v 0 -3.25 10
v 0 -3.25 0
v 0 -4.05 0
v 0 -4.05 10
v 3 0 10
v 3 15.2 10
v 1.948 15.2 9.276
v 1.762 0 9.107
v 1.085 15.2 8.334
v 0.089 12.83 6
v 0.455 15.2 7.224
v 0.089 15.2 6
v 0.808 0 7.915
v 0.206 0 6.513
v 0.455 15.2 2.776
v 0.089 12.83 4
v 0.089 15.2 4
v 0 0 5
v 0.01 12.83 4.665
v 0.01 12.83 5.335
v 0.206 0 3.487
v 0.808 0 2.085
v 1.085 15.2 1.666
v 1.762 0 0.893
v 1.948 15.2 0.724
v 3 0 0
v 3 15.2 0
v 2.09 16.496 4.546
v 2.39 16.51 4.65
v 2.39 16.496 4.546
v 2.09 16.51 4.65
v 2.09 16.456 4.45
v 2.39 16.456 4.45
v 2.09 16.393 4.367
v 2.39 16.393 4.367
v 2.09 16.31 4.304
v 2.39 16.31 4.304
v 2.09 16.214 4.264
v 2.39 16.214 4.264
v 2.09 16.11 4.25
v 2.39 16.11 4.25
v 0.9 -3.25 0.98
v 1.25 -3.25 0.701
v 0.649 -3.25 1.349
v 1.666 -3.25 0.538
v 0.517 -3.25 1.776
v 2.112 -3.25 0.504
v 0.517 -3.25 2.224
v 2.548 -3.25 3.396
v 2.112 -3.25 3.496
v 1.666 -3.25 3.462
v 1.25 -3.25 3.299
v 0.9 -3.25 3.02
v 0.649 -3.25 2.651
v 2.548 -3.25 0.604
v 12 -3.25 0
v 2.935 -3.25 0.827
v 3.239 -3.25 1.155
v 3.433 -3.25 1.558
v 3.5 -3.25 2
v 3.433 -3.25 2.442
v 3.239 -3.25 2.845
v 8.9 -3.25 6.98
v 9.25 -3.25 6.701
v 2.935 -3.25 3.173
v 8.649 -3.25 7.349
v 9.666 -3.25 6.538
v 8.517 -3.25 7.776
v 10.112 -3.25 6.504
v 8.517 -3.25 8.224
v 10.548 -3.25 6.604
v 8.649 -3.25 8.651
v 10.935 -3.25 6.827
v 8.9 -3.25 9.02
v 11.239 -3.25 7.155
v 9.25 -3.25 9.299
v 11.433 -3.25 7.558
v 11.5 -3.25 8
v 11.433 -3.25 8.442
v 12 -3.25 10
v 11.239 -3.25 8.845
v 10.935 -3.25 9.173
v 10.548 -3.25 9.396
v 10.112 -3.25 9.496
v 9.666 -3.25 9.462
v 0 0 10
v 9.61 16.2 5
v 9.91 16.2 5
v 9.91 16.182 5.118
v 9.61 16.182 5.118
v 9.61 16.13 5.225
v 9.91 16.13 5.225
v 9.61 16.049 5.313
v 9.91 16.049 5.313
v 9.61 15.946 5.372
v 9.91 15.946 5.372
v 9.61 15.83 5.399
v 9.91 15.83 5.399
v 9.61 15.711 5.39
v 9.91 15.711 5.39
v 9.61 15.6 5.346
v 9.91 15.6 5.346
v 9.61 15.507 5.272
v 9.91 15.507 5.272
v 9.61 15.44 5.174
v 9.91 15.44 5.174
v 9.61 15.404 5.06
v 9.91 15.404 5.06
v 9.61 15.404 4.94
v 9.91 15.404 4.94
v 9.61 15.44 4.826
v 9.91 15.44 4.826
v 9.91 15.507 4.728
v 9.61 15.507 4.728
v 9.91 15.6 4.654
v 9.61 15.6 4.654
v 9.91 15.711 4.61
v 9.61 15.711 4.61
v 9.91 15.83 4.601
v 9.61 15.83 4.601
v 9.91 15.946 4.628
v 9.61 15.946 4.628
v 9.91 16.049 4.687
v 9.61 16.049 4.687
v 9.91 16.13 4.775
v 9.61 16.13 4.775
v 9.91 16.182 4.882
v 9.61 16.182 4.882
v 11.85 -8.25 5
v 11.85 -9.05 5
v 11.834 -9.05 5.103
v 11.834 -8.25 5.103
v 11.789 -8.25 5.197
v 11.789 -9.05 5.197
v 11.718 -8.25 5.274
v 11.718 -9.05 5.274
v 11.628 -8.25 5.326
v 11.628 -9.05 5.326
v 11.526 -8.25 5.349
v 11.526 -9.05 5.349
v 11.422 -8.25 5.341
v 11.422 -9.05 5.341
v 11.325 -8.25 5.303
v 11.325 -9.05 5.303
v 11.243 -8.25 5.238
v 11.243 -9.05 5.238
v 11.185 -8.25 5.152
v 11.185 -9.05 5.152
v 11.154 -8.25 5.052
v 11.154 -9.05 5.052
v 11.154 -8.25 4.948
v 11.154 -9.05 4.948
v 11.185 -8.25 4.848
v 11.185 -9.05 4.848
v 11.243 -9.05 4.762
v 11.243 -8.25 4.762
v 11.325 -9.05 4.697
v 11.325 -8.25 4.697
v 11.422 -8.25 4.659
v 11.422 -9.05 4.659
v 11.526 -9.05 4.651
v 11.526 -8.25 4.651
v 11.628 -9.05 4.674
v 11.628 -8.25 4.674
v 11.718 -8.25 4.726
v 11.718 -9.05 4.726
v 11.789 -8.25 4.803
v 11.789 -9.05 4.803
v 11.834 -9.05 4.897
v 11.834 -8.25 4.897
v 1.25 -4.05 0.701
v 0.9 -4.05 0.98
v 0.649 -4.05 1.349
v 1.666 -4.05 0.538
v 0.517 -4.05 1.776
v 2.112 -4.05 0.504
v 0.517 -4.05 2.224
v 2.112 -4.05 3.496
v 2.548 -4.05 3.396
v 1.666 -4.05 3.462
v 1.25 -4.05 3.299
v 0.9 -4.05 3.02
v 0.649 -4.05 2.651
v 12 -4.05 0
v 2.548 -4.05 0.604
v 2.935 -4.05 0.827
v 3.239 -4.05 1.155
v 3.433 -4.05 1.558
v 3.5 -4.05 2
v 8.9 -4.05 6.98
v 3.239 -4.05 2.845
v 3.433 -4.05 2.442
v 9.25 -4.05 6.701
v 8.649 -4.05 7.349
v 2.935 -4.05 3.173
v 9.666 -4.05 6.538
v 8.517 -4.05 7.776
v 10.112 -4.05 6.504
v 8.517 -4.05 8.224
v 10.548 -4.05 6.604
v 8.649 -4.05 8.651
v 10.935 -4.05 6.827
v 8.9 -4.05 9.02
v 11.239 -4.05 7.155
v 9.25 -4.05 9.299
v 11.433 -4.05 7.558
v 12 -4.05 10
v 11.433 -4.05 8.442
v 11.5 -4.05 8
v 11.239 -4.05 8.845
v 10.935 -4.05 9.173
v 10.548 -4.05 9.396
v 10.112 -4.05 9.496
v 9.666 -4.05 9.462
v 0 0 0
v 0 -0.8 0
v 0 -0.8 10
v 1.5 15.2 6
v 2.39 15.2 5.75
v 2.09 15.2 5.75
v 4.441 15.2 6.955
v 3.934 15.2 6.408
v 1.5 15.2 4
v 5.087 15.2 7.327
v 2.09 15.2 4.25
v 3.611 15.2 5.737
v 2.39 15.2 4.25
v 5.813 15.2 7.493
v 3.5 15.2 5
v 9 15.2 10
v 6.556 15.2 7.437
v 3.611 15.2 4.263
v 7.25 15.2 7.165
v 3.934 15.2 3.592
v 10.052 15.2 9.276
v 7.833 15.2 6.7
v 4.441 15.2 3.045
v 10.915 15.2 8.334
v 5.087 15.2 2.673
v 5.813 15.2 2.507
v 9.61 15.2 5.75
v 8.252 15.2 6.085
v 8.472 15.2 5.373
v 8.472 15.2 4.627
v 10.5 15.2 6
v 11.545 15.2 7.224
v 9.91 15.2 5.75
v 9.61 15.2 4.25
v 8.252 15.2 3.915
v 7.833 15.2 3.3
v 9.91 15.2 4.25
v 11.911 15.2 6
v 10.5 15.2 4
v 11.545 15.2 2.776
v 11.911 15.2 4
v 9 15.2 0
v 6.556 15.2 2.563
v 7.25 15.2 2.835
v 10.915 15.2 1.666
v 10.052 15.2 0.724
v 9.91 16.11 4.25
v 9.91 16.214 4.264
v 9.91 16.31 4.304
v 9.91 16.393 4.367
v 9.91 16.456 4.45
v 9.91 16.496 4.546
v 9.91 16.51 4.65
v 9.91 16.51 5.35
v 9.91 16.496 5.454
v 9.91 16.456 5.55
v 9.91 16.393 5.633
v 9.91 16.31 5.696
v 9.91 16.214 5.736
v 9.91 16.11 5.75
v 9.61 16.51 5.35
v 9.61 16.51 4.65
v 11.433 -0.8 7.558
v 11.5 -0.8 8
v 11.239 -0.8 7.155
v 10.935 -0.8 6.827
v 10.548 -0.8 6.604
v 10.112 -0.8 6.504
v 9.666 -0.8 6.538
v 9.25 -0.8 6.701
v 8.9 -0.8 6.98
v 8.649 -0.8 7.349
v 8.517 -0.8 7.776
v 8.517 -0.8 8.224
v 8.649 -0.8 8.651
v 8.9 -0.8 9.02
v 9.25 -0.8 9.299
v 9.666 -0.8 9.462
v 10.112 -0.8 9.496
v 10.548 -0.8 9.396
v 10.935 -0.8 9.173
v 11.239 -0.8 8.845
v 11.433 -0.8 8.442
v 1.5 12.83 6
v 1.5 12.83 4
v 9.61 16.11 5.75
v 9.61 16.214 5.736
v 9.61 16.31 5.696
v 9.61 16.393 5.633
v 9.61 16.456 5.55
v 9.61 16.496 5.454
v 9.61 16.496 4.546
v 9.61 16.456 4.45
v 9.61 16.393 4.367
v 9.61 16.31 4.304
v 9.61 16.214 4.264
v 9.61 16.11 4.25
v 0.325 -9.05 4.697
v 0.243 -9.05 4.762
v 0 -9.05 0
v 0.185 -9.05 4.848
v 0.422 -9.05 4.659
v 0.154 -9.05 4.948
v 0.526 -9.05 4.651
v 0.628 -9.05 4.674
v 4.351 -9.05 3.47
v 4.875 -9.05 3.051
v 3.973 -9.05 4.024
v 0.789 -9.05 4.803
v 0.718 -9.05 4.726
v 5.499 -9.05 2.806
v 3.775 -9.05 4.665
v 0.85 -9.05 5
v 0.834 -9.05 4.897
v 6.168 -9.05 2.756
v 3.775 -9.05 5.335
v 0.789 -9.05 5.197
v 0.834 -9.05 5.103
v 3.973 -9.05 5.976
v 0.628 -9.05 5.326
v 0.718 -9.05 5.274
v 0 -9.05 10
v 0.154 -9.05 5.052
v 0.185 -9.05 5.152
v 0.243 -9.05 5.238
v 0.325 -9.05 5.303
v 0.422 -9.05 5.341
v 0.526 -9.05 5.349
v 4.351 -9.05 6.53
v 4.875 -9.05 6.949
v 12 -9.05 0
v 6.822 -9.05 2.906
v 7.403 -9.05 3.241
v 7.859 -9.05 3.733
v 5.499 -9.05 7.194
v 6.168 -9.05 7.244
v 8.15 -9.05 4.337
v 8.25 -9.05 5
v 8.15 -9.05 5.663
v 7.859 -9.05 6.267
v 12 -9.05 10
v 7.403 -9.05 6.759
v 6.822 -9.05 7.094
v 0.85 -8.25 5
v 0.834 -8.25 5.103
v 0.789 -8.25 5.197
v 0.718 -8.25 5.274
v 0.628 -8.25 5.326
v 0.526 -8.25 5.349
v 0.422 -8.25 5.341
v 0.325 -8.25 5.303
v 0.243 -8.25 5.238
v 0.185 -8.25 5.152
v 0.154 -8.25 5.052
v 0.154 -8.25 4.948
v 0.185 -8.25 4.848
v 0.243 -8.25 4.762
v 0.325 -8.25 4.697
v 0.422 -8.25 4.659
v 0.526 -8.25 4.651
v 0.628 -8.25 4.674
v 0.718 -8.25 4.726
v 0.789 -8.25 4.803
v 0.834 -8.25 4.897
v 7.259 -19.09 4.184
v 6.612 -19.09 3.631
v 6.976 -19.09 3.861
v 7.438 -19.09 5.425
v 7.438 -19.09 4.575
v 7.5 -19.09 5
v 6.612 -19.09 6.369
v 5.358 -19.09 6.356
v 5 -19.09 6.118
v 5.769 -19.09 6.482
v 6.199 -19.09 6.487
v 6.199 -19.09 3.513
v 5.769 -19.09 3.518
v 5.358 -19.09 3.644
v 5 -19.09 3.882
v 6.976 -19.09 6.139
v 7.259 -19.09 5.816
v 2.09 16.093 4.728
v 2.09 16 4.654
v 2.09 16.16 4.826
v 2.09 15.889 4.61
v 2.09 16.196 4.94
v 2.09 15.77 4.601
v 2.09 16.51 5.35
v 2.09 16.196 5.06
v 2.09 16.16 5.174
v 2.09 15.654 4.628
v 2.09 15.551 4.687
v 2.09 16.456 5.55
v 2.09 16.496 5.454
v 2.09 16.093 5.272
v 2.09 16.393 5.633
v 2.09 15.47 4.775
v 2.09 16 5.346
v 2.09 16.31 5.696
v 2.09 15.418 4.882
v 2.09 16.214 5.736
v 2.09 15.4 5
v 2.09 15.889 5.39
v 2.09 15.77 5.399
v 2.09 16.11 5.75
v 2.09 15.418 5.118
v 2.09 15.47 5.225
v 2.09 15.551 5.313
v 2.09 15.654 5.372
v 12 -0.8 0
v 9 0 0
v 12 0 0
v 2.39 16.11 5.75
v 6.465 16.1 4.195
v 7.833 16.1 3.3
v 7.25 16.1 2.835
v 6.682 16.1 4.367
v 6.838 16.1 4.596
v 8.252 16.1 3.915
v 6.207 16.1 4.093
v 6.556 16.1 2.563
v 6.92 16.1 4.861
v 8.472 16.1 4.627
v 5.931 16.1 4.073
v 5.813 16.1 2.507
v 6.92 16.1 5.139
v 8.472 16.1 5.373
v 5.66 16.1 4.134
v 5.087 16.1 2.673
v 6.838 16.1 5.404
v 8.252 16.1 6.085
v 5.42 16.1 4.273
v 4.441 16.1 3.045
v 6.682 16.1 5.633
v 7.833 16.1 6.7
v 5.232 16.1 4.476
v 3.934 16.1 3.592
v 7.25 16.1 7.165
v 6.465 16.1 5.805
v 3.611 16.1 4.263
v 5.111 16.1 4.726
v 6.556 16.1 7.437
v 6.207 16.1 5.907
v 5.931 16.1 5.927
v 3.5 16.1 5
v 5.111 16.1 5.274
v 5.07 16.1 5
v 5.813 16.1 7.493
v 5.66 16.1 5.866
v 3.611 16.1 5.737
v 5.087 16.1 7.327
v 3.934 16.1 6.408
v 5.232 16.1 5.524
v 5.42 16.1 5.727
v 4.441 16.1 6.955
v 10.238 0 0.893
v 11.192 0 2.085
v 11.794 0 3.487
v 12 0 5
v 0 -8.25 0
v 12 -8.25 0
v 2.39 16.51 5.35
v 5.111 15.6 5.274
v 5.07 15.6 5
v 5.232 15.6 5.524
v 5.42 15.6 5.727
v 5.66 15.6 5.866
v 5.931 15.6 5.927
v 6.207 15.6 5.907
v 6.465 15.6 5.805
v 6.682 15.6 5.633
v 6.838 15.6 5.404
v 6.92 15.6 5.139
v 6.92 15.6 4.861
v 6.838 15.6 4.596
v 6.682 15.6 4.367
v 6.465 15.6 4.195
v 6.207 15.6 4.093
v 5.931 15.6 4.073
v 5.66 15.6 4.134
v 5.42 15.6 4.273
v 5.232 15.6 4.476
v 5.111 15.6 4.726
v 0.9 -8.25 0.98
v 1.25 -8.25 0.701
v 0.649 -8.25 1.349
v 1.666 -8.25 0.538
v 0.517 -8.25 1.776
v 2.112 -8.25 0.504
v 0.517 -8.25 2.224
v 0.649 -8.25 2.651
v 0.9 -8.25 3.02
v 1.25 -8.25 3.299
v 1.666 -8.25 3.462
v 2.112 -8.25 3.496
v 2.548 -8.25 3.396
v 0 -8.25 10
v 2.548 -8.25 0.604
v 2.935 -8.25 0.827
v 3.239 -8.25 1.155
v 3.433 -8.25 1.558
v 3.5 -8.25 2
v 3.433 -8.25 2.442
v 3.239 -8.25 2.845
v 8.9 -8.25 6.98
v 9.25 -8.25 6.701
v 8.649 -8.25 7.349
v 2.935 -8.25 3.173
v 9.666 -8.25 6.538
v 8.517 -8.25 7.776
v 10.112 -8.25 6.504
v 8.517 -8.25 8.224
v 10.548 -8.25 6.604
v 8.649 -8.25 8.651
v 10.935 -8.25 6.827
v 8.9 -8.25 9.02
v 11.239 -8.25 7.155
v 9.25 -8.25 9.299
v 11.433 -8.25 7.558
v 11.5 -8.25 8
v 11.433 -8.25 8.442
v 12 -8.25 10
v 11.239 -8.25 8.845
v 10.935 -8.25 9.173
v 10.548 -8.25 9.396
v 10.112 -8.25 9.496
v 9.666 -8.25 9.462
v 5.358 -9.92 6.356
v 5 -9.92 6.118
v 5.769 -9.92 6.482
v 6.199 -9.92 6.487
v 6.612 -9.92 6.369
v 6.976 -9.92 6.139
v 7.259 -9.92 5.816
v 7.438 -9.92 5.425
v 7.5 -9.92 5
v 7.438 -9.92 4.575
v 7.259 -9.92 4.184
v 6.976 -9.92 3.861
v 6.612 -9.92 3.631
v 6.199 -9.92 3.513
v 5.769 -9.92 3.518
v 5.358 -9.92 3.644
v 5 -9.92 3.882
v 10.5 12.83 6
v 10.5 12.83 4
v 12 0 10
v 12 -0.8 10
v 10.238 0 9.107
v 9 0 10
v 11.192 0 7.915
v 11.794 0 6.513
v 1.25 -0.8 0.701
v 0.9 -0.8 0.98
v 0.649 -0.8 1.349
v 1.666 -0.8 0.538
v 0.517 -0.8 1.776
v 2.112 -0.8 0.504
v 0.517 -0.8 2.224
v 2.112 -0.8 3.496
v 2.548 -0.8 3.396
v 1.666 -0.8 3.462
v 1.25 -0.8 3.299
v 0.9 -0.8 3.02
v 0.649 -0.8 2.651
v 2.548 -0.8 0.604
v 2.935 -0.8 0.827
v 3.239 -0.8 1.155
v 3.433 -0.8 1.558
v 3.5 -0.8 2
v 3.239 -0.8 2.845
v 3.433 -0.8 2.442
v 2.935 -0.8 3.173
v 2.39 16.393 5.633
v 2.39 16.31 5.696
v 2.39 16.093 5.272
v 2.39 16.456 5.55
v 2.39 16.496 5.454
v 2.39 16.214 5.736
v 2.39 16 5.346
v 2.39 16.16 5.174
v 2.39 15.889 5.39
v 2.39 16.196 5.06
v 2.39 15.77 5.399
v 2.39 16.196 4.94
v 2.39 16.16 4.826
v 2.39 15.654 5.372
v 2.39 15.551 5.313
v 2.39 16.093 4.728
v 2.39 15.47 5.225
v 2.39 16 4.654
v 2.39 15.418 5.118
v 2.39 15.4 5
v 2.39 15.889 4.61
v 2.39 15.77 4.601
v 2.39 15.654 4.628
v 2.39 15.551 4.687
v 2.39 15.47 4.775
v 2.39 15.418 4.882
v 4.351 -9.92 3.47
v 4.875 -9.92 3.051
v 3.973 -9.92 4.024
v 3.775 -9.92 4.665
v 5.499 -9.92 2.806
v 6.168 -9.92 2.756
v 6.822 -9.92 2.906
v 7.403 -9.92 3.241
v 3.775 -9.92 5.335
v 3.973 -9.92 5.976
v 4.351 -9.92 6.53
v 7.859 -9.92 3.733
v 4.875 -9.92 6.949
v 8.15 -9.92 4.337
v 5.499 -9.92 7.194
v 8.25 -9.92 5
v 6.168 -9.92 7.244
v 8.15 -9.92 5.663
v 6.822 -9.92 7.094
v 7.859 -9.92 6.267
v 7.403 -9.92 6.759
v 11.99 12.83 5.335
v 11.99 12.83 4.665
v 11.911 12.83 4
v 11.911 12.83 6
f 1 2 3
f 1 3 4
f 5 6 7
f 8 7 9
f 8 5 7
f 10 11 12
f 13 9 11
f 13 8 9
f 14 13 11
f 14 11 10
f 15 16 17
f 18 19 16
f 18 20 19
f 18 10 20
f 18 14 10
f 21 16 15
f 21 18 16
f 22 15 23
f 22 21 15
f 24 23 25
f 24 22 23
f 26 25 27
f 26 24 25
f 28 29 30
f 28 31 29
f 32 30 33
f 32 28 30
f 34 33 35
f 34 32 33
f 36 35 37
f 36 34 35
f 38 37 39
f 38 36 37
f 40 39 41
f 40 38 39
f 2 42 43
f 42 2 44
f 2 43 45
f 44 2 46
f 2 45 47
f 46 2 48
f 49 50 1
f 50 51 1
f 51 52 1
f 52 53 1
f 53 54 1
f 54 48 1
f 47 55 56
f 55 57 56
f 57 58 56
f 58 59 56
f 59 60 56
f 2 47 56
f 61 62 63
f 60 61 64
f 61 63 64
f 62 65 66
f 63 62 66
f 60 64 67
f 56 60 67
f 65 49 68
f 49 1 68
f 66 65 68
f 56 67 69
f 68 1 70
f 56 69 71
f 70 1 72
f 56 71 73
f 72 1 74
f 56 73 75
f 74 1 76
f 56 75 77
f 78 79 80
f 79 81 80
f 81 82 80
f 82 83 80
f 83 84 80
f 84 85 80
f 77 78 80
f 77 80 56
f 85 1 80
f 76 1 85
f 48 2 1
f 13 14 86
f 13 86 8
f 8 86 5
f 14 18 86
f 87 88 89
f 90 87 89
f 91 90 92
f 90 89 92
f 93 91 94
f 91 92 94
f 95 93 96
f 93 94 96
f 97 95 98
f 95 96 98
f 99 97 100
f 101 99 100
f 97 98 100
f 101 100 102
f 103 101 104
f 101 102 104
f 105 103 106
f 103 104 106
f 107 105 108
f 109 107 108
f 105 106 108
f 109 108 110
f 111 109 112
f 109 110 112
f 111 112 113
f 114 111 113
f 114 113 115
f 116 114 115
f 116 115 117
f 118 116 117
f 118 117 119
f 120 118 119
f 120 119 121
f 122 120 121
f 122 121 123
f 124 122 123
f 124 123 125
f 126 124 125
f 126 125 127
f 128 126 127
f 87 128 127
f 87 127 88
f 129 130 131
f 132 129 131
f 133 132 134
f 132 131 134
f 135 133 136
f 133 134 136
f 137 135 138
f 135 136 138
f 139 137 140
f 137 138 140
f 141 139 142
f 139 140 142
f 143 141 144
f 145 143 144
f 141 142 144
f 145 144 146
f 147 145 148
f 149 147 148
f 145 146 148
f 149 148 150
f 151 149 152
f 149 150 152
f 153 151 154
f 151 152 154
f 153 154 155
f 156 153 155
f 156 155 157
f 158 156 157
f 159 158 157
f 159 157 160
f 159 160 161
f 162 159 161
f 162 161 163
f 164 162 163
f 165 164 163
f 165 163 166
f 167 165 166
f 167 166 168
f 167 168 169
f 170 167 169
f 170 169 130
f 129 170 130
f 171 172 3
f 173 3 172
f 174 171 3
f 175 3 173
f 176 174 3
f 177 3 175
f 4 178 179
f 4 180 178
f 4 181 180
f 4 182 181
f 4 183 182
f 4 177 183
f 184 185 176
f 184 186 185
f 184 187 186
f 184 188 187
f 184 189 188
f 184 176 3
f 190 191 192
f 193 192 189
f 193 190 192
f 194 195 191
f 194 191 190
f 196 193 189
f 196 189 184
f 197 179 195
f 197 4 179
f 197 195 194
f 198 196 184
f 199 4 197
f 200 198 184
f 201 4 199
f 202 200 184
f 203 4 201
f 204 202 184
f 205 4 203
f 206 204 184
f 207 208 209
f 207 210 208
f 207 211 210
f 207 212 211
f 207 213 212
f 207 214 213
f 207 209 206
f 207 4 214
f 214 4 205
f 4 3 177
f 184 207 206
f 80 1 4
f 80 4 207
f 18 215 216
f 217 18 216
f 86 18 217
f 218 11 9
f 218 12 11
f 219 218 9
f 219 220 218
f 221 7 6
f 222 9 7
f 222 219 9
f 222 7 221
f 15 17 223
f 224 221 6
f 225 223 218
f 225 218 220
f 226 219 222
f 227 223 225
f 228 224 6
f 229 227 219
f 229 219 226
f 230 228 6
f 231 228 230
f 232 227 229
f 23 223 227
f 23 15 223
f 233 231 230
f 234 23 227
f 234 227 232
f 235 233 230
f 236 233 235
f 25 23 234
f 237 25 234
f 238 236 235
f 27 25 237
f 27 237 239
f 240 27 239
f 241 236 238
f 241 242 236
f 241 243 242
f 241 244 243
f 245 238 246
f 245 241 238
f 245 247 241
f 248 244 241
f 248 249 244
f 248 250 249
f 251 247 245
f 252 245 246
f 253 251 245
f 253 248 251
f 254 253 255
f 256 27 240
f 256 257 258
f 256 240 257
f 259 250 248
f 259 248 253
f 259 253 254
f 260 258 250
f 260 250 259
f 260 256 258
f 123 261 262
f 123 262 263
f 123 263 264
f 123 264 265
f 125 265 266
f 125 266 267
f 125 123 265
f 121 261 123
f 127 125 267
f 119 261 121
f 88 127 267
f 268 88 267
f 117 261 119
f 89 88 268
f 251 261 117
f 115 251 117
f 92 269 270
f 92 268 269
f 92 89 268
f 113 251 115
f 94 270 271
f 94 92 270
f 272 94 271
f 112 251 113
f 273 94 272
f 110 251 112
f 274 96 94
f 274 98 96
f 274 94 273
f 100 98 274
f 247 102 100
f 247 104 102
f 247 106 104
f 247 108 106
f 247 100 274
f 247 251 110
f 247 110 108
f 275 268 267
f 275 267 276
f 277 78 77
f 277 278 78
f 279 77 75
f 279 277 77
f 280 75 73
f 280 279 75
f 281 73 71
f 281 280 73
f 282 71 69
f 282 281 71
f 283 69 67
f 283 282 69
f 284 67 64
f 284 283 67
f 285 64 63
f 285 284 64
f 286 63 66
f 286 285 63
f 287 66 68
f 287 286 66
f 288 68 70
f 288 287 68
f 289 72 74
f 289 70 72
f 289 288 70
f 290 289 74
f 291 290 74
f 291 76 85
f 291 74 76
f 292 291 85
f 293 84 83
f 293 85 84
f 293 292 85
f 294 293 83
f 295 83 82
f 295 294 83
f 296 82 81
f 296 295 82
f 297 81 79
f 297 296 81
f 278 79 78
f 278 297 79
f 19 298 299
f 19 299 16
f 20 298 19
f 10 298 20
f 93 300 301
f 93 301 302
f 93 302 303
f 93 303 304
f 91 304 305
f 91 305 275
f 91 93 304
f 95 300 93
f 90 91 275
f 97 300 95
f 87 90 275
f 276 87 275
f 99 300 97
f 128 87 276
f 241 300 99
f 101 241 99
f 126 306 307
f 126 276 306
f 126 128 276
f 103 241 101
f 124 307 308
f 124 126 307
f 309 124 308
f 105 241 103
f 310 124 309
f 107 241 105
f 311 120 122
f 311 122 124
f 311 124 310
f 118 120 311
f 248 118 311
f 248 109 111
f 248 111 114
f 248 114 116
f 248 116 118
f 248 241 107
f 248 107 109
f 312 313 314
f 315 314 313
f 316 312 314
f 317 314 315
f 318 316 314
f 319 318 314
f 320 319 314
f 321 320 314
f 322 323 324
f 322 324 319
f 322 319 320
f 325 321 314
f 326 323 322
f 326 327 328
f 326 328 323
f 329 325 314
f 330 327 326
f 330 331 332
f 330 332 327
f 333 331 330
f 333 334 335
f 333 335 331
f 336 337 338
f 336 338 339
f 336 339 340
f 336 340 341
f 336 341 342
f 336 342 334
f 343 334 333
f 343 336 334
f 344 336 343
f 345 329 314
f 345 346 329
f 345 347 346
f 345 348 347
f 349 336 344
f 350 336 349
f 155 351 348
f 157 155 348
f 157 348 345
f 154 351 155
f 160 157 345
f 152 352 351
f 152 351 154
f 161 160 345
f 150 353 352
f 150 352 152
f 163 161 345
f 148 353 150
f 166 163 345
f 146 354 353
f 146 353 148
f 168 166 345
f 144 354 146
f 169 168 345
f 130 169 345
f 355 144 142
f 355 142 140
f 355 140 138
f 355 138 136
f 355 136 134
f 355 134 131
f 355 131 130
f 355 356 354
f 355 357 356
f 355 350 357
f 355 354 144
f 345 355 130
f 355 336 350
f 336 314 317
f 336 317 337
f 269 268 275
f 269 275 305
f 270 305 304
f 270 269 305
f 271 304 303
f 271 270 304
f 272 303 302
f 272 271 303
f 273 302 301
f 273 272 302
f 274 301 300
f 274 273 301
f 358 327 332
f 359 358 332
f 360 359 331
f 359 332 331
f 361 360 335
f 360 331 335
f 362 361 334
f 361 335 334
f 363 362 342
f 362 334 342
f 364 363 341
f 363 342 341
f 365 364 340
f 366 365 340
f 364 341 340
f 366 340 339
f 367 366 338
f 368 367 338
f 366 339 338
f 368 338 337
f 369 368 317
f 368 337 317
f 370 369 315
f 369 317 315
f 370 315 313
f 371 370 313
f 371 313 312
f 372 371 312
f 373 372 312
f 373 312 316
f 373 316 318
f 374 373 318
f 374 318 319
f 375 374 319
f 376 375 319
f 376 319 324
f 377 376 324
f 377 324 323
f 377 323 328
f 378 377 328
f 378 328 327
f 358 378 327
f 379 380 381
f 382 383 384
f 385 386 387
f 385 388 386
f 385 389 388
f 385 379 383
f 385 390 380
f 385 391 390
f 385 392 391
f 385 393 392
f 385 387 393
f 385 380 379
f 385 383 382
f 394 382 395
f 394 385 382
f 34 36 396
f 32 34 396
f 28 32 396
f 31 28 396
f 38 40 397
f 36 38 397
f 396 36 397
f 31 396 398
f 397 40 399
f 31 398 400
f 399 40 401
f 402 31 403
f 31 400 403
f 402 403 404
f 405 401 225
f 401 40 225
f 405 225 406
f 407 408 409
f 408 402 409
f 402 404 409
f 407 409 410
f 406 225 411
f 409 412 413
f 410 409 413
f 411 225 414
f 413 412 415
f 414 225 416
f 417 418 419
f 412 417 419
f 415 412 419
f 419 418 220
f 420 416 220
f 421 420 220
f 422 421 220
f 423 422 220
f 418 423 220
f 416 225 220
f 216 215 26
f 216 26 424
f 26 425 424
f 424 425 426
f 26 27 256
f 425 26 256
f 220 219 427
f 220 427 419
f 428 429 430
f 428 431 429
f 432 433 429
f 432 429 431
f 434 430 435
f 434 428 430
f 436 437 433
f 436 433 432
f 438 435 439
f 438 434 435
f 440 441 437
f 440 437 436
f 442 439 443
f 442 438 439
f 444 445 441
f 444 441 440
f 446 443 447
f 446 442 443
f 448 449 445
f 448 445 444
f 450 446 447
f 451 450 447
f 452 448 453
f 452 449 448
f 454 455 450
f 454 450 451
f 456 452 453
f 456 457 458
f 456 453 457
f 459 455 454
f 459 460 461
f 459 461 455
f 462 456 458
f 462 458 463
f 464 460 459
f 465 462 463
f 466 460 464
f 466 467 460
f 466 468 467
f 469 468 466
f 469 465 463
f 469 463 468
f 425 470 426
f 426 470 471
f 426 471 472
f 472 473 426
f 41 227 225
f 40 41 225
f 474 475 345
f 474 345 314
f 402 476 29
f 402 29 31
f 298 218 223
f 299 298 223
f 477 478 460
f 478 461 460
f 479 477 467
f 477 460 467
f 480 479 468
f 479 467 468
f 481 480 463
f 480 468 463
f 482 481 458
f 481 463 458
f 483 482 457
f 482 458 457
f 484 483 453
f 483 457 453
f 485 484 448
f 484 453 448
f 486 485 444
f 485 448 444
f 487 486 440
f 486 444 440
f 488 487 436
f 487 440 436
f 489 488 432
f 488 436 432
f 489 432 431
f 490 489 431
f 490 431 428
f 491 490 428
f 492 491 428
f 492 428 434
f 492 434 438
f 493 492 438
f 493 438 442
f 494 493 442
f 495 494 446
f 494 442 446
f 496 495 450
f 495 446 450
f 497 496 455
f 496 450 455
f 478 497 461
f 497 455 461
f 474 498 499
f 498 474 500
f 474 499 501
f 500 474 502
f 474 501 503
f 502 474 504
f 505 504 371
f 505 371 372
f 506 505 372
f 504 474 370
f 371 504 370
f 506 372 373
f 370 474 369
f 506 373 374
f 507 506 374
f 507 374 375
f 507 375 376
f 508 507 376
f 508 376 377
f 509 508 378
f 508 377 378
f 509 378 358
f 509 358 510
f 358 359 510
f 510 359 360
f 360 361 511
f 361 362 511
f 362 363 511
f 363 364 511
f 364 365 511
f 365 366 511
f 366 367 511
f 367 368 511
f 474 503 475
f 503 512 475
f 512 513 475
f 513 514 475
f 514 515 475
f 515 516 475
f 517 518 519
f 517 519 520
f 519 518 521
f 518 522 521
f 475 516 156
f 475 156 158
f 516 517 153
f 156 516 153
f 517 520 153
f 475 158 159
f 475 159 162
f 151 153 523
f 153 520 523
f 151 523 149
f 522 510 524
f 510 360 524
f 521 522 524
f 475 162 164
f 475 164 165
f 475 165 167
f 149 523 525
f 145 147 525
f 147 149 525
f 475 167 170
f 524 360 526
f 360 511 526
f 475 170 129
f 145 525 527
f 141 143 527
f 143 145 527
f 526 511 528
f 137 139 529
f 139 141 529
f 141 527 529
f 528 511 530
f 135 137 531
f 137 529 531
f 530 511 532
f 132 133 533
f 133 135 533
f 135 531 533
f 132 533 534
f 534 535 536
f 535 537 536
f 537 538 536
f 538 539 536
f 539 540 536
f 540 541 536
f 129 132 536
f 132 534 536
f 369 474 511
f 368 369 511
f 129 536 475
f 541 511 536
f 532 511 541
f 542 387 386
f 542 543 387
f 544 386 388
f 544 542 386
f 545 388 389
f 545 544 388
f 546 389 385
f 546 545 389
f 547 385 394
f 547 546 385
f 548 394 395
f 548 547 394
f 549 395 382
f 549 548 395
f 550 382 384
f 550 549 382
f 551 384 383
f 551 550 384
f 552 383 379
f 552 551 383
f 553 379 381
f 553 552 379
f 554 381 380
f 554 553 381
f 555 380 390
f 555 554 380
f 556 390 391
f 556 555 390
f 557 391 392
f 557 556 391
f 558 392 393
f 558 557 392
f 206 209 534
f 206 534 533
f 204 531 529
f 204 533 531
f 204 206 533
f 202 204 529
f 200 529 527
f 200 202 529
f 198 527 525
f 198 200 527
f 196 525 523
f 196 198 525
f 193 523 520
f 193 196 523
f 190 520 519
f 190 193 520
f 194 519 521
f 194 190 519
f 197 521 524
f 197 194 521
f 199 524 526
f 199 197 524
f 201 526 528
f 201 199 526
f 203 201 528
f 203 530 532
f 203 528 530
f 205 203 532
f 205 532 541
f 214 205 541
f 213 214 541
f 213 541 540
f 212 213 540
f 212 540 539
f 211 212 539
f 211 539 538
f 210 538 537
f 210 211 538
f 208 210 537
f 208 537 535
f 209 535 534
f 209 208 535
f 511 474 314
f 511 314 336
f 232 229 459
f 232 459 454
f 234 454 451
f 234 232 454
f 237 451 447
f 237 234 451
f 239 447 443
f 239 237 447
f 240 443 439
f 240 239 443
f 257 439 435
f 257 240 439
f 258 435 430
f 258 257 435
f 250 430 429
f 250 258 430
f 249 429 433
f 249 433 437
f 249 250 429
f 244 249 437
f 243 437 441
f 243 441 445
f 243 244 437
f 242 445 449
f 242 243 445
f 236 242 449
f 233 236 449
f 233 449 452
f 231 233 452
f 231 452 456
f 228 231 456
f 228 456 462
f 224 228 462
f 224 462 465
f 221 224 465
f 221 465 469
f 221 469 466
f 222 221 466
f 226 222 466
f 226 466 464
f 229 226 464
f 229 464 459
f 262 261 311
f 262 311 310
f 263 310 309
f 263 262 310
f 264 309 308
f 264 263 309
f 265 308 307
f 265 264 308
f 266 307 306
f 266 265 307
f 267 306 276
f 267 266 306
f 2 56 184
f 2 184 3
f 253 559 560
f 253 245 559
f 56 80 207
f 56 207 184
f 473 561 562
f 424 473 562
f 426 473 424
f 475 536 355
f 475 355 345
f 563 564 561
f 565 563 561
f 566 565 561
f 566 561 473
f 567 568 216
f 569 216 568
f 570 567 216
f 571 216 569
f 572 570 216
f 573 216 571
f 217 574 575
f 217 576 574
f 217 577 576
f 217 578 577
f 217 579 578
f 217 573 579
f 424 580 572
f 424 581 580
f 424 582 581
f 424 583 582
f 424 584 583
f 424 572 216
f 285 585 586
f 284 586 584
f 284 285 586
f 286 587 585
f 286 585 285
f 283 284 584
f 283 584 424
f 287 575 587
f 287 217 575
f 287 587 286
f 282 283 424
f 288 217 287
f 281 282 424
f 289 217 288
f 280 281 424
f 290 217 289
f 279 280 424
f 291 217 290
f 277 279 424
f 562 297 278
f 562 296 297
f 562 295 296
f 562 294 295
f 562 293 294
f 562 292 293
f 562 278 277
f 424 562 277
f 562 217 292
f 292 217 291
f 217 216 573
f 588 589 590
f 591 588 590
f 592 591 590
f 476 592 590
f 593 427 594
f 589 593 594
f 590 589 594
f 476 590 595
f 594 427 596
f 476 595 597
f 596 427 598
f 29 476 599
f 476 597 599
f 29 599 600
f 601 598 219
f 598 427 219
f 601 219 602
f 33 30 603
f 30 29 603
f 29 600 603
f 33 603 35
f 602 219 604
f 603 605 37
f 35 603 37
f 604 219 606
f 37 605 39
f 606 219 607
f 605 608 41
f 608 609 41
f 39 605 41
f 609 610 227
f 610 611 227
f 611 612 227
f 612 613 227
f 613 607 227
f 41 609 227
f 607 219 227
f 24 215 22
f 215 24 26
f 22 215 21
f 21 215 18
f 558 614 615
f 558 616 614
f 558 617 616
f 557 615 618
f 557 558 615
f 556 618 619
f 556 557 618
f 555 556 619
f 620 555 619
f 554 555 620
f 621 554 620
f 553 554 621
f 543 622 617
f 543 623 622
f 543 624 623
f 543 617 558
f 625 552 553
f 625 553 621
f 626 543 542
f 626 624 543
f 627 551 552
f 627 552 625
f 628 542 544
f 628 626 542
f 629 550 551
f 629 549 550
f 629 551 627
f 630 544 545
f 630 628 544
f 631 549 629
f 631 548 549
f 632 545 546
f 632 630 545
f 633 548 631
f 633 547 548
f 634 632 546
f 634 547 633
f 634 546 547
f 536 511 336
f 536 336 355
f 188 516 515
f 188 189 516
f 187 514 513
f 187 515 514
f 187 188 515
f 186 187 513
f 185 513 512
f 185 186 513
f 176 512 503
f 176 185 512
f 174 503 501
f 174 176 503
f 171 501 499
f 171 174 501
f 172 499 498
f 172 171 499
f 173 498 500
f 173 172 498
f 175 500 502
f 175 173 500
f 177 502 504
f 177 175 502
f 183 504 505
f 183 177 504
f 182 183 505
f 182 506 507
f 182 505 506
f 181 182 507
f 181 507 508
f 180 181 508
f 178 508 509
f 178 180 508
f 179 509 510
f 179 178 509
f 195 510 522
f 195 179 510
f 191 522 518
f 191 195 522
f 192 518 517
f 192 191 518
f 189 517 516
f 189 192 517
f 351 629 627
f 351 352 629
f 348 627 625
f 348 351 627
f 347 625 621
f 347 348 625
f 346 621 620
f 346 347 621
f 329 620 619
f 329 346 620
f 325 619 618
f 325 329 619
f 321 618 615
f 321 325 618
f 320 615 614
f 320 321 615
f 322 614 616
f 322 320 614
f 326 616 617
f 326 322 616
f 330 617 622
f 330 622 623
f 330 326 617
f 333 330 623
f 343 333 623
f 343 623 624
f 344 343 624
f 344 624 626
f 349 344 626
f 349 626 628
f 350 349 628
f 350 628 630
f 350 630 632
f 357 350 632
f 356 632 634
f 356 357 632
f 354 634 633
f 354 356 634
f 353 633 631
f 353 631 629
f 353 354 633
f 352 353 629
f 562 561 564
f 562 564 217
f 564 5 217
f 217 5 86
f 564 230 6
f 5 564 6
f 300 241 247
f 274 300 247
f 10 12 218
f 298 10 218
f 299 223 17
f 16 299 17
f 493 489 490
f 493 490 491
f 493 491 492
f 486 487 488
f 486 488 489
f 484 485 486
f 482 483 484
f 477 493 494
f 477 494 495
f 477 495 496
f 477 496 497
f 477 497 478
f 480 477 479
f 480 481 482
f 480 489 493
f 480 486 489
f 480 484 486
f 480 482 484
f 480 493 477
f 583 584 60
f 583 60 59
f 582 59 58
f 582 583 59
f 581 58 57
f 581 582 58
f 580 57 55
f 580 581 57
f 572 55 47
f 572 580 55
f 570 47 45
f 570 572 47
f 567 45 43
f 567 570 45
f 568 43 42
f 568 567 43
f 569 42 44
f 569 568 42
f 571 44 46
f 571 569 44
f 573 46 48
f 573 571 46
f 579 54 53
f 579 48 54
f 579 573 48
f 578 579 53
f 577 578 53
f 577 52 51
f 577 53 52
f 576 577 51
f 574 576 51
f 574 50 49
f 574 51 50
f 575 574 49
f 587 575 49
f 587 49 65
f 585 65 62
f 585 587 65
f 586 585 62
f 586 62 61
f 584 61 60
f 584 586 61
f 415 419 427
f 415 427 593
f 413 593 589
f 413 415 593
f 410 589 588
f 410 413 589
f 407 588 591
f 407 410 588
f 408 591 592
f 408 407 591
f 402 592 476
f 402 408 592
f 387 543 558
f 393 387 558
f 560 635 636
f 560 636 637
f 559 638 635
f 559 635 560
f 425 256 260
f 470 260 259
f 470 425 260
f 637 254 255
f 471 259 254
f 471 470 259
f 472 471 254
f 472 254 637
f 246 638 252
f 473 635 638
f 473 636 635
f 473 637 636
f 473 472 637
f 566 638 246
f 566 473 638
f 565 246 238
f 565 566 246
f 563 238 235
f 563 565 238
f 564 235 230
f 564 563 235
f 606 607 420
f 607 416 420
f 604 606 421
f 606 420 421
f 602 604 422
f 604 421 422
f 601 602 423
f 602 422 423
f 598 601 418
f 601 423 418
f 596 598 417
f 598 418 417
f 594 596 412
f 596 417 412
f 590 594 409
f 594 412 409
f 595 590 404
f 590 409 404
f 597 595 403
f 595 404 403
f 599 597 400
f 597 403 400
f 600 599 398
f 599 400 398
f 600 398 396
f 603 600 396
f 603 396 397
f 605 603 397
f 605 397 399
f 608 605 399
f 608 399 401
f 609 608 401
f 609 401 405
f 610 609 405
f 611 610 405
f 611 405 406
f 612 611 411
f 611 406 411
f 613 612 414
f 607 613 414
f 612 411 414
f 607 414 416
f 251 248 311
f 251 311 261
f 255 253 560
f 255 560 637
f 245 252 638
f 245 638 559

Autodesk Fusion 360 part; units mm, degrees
sketch "Sketch1" plane through (0, 0, 0) normal (0, 1, 0) x (1, 0, 0)
  line L0 (0, 0) -> (12, 0)
  line L1 (0, 0) -> (0, -10)
  line L2 (12, 0) -> (12, -10)
  line L3 (12, -10) -> (0, -10)
  line L4 (12, -10) -> (9, -10)
  arc A0 (9, -10) -> (9, 0) centre (6.3333, -5) ccw
  line L5 (0, -10) -> (3, -10)
  arc A1 (3, 0) -> (3, -10) centre (5.6667, -5) ccw
  dimension "d3" = 12
  dimension "d4" = 10
  dimension "d5" = 3
  dimension "d6" = 3
extrude "Extrude1" add sketch "Sketch1" along normal blind 15.2 contours L0 L3 A0 A1 makes body 1
sketch "Sketch2" plane through (0, 0, 0) normal (0, -1, 0) x (1, 0, 0)
  arc A0 (9, 0) -> (9, 10) centre (6.3333, 5) ccw
  line L0 (9, 10) -> (3, 10)
  arc A1 (3, 10) -> (3, 0) centre (5.6667, 5) ccw
  line L1 (3, 0) -> (9, 0)
  line L2 (0, 10) -> (12, 10)
  line L3 (12, 10) -> (12, 0)
  line L4 (12, 0) -> (0, 0)
  line L5 (0, 0) -> (0, 10)
extrude "Extrude2" add sketch "Sketch2" along normal blind 0.8 bodies 1
sketch "Sketch3" plane through (0, -0.8, 0) normal (0, -1, 0) x (1, 0, 0)
  line L0 (0, 0) -> (12, 0)
  line L1 (12, 0) -> (12, 10)
  line L2 (12, 10) -> (0, 10)
  line L3 (0, 10) -> (0, 0)
  circle A0 centre (2, 2) radius 1.5
  circle A1 centre (10, 8) radius 1.5
  dimension "d11" = 3
  dimension "d12" = 3
extrude "Extrude3" add sketch "Sketch3" along normal blind 2.45 contours A0 | A1 bodies 1
sketch "Sketch4" plane through (0, -3.25, 0) normal (0, -1, 0) x (1, 0, 0)
  circle A0 centre (2, 2) radius 1.5
  line L0 (0, 10) -> (12, 10)
  line L1 (12, 10) -> (12, 0)
  line L2 (12, 0) -> (0, 0)
  line L3 (0, 0) -> (0, 10)
extrude "Extrude4" add sketch "Sketch4" along normal blind 0.8 separate body makes body 2
extrude "Extrude5" add 1 faces at (1.5, -3.25, 2.6802) along direction (0, -1, 0) blind 0.8 on bodies 1 bodies 1 2
sketch "Sketch5" plane through (0, -4.05, 0) normal (0, -1, 0) x (1, 0, 0)
  line L0 (0, 0) -> (12, 0)
  line L1 (12, 0) -> (12, 10)
  line L2 (12, 10) -> (0, 10)
  line L3 (0, 10) -> (0, 0)
  circle A0 centre (2, 2) radius 1.5
  circle A1 centre (10, 8) radius 1.5
  dimension "d19" = 3
  dimension "d20" = 3
extrude "Extrude6" add sketch "Sketch5" along normal blind 4.2 contours A0 | A1 bodies 1
sketch "Sketch6" plane through (0, -8.25, 0) normal (0, -1, 0) x (1, 0, 0)
  circle A0 centre (10, 8) radius 1.5
  line L0 (0, 10) -> (12, 10)
  line L1 (12, 10) -> (12, 0)
  line L2 (12, 0) -> (0, 0)
  line L3 (0, 0) -> (0, 10)
extrude "Extrude7" add sketch "Sketch6" along normal blind 0.8 contours A0 | L0 L1 L2 L3 bodies 1
sketch "Sketch7" plane through (0, -9.05, 0) normal (0, -1, 0) x (1, 0, 0)
  line L0 (0, 0) -> (12, 0)
  line L1 (12, 0) -> (12, 10)
  line L2 (12, 10) -> (0, 10)
  line L3 (0, 10) -> (0, 0)
  line L4 (0, 5) -> (12, 5)
  line L5 (6, 10) -> (6, 0)
  circle A0 centre (6, 5) radius 2.25
  circle A1 centre (0.5, 5) radius 0.35
  circle A2 centre (11.5, 5) radius 0.35
  dimension "d25" = 4.5
  dimension "d26" = 0.7
extrude "Extrude8" cut sketch "Sketch7" against normal blind 2 contours L4 A1 | L4 A1 | L4 A2 | L4 A2 bodies 1
extrude "Extrude9" add sketch "Sketch7" along normal blind 0.87 contours L4 L5 A0 | L4 L5 A0 | L4 L5 A0 | L4 L5 A0 bodies 1
sketch "Sketch8" plane through (0, -9.92, 0) normal (0, -1, 0) x (1, 0, 0)
  circle A0 centre (6, 5) radius 2.25
  line L0 (7.5, 5) -> (5, 5)
  line L1 (5, 5) -> (5, 6.118)
  line L2 (5, 5) -> (5, 3.882)
  arc A1 (5, 3.882) -> (5, 6.118) centre (6, 5) ccw
  dimension "d31" = 3
  dimension "d32" = 2.5
extrude "Extrude10" add sketch "Sketch8" along normal blind 9.17 contours L0 L2 A1 | L0 L1 A1 bodies 1
sketch "Sketch9" plane through (0, 15.2, 0) normal (0, 1, 0) x (-1, 0, 0)
  arc A0 (-9, 10) -> (-9, 0) centre (-6.3333, 5) ccw
  line L0 (-9, 0) -> (-3, 0)
  arc A1 (-3, 0) -> (-3, 10) centre (-5.6667, 5) ccw
  line L1 (-3, 10) -> (-9, 10)
  circle A2 centre (-6, 5) radius 2.5
  line L2 (0, 5) -> (-1.5, 5)
  line L3 (-1.5, 5) -> (-1.5, 4)
  line L4 (0, 5) -> (0, 6)
  line L5 (0, 6) -> (-1.5, 6)
  line L6 (-1.5, 6) -> (-1.5, 4)
  line L7 (-1.5, 4) -> (0, 4)
  line L8 (0, 4) -> (0, 6)
  line L9 (-6, 10) -> (-6, 0)
  line L10 (-10.5, 6) -> (-10.5, 4)
  line L11 (-12, 4) -> (-12, 6)
  line L12 (-10.5, 4) -> (-12, 4)
  line L13 (-12, 6) -> (-10.5, 6)
  dimension "d35" = 5
  dimension "d36" = 1.5
  dimension "d37" = 1
  dimension "d38" = 1
extrude "Extrude11" add sketch "Sketch9" along normal blind 0.9 contours A2 L9 | A2 L9 bodies 1
extrude "Extrude12" cut sketch "Sketch9" against normal blind 2.37 contours A0 L10 L12 L13 | A1 L2 L5 L6 | A1 L2 L3 L6 L7 bodies 1
sketch "Sketch10" plane through (0, 15.2, 0) normal (0, 1, 0) x (-1, 0, 0)
  line L0 (-0.0889, 4) -> (-1.5, 4)
  line L1 (-1.5, 4) -> (-1.5, 6)
  line L2 (-1.5, 6) -> (-0.0889, 6)
  arc A0 (-0.0889, 6) -> (-3, 10) centre (-5.6667, 5) ccw
  line L3 (-3, 10) -> (-9, 10)
  arc A1 (-9, 10) -> (-11.9111, 6) centre (-6.3333, 5) ccw
  line L4 (-11.9111, 6) -> (-10.5, 6)
  line L5 (-10.5, 6) -> (-10.5, 4)
  line L6 (-10.5, 4) -> (-11.9111, 4)
  arc A2 (-11.9111, 4) -> (-9, 0) centre (-6.3333, 5) ccw
  line L7 (-9, 0) -> (-3, 0)
  arc A3 (-3, 0) -> (-0.0889, 4) centre (-5.6667, 5) ccw
  circle A4 centre (-6, 5) radius 2.5
  line L8 (-3.5, 5) -> (-2.39, 5)
  line L9 (-2.39, 5) -> (-2.39, 4.25)
  line L10 (-2.39, 4.25) -> (-2.09, 4.25)
  line L11 (-2.09, 4.25) -> (-2.09, 5)
  line L12 (0, 5) -> (-12, 5)
  line L13 (-3.5, 5) -> (-2.39, 5)
  line L14 (-2.39, 5.75) -> (-2.09, 5.75)
  line L15 (-2.09, 5.75) -> (-2.09, 5)
  line L16 (-2.39, 5) -> (-2.39, 5.75)
  line L17 (-6, 10) -> (-6, 0)
  line L18 (-9.61, 5) -> (-9.61, 4.25)
  line L19 (-9.91, 4.25) -> (-9.91, 5)
  line L20 (-9.61, 4.25) -> (-9.91, 4.25)
  line L21 (-12, 5) -> (0, 5)
  line L22 (-9.61, 5.75) -> (-9.91, 5.75)
  line L23 (-9.61, 5) -> (-9.61, 5.75)
  line L24 (-9.91, 5.75) -> (-9.91, 5)
  dimension "d43" = 1.11
  dimension "d44" = 0.75
  dimension "d45" = 0.3
extrude "Extrude13" add sketch "Sketch10" along normal blind 1.31 contours L9 L10 L11 L12 L21 | L12 L14 L15 L16 L21 | L12 L18 L19 L20 L21 | L12 L21 L22 L23 L24 bodies 1
sketch "Sketch11" plane through (2.09, 0, 0) normal (-1, 0, 0) x (0, -1, 0)
  line L0 (-15.2, 4.25) -> (-15.2, 5.75)
  line L1 (-15.2, 5.75) -> (-16.51, 5.75)
  line L2 (-16.51, 5.75) -> (-16.51, 4.25)
  line L3 (-16.51, 4.25) -> (-15.2, 4.25)
  circle A0 centre (-15.8, 5) radius 0.4
extrude "Extrude14" cut sketch "Sketch11" against normal blind 0.7 contours A0 bodies 1
sketch "Sketch12" plane through (9.91, 0, 0) normal (1, 0, 0) x (0, 1, 0)
  line L0 (15.2, 5.75) -> (15.2, 4.25)
  line L1 (15.2, 4.25) -> (16.51, 4.25)
  line L2 (16.51, 4.25) -> (16.51, 5.75)
  line L3 (16.51, 5.75) -> (15.2, 5.75)
  circle A0 centre (15.8, 5) radius 0.4
extrude "Extrude15" cut sketch "Sketch12" against normal blind 0.4 contours A0 bodies 1
fillet "Fillet1" radius 0.4 2 edges at (9.76, 16.51, 4.25) (9.76, 16.51, 5.75) on bodies 1
fillet "Fillet2" radius 0.4 2 edges at (2.24, 16.51, 4.25) (2.24, 16.51, 5.75) on bodies 1
sketch "Sketch13" plane through (0, 16.1, 0) normal (0, 1, 0) x (-1, 0, 0)
  circle A0 centre (-6, 5) radius 2.5
  circle A1 centre (-6, 5) radius 0.93
  dimension "d56" = 1.86
extrude "Extrude16" cut sketch "Sketch13" against normal blind 0.5 contours A1 bodies 1
equation "d5 = ( 12 / 4 ) * 1 mm"
equation "d7 = 16 mm - 0.8 mm"
equation "d44 = ( 1.5 / 2 ) * 1 mm"
